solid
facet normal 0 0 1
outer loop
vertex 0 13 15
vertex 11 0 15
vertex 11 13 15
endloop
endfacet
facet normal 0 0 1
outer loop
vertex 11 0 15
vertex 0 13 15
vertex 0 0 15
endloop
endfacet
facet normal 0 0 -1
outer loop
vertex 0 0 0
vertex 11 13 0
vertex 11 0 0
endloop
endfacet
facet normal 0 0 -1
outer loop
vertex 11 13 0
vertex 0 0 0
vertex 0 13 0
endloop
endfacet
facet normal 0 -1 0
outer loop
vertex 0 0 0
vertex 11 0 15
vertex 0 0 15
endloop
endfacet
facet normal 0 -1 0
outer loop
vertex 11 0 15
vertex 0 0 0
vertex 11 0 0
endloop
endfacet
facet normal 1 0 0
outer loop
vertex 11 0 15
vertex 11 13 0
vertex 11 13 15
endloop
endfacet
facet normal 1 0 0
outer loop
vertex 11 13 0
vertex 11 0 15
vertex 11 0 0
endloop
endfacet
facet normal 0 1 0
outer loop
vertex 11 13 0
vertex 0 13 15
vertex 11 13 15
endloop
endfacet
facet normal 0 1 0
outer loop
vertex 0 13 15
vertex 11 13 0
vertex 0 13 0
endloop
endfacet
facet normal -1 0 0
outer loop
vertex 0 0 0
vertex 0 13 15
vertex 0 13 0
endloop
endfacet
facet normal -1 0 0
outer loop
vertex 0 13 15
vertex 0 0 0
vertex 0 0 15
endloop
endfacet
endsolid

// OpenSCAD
// Generated by SolidPython 1.0.1 on 2020-07-29 00:39:26


cube(size = [11, 13, 15]);
/***********************************************
*********      SolidPython code:      **********
************************************************
 
# import packages: SolidPython
from solid import *
from solid.utils import *
from itertools import chain, combinations


class Resize:

    def __init__(self, scad_file):
        self.scad_file = scad_file
        #self.scad_file = import_scad(scad_file)
        # cone/cylinder param:
        self.r1 = 0
        self.r2 = 0
        self.h = 0
        # rectangular prism param:
        self.w = 0
        self.l = 0
        # ellipse param:
        self.r = 0

    # import OpenScad code (file name corresponds to shape)


    # classify shape + parameters
    def assign(self, param1, param2, param3):
        if self.scad_file == 'cone.scad':
            self.r1 = param1
            self.r2 = param2
            self.h = param3
        elif self.scad_file == 'cylinder.scad':
            self.r1 = param1
            self.r2 = param2
            self.h = param3
        elif self.scad_file == 'rectangularPrism.scad':
            self.h = param1
            self.l = param2
            self.w = param3
        else:
            self.r = param1
            self.h = param2

    # resize parameters
    def iterate(self):
        x = range(3, 20, 2)
        i = 1
        if self.scad_file == 'cone.scad':
            tempList = list(combinations(x, 2))
            for temp in tempList:
                param1 = temp[0]
                param2 = temp[1]
                filepath = 'produced_scad_files/' + 'cone' + str(param1) + '_' + str(param2) + '_' + '.scad'
                scad_render_to_file(cylinder(h=param1, r1=param2, r2=0), filepath)

        elif self.scad_file == 'cylinder.scad':
            tempList = list(combinations(x, 3))
            for temp in tempList:
                param1 = temp[0]
                param2 = temp[1]
                filepath = 'produced_scad_files/' + 'cylinder' + str(param1) + '_' + str(param2) + '_' + '.scad'
                scad_render_to_file(cylinder(h=param1, r1=param2, r2=param2), filepath)

        elif self.scad_file == 'rectangularPrism.scad':
            tempList = list(combinations(x, 3))
            for temp in tempList:
                param1 = temp[0]
                param2 = temp[1]
                param3 = temp[2]
                filepath = 'produced_scad_files/' + 'rectangularPrism' + str(param1) + '_' + str(param2) + '_' + str(
                    param3) + '.scad'
                scad_render_to_file(cube(size=(param1, param2, param3)), filepath)

        elif self.scad_file == 'ellipse.scad':
            tempList = list(combinations(x, 4))
            for temp in tempList:
                param1 = temp[0]
                param2 = temp[1]
                param3 = temp[2]
                param4 = temp[3]
                filepath = 'produced_scad_files/' + 'ellipse' + str(param1) + '_' + str(param2) + '_' + str(param3) + '_' + str(param4) + '.scad'
                scad_render_to_file(scale([param1, param2, param3])(sphere(r=param4)), filepath)

    def render_to_scadfile(self):
        scad_render_to_file(scad, 'example.scad') 
 
************************************************/
